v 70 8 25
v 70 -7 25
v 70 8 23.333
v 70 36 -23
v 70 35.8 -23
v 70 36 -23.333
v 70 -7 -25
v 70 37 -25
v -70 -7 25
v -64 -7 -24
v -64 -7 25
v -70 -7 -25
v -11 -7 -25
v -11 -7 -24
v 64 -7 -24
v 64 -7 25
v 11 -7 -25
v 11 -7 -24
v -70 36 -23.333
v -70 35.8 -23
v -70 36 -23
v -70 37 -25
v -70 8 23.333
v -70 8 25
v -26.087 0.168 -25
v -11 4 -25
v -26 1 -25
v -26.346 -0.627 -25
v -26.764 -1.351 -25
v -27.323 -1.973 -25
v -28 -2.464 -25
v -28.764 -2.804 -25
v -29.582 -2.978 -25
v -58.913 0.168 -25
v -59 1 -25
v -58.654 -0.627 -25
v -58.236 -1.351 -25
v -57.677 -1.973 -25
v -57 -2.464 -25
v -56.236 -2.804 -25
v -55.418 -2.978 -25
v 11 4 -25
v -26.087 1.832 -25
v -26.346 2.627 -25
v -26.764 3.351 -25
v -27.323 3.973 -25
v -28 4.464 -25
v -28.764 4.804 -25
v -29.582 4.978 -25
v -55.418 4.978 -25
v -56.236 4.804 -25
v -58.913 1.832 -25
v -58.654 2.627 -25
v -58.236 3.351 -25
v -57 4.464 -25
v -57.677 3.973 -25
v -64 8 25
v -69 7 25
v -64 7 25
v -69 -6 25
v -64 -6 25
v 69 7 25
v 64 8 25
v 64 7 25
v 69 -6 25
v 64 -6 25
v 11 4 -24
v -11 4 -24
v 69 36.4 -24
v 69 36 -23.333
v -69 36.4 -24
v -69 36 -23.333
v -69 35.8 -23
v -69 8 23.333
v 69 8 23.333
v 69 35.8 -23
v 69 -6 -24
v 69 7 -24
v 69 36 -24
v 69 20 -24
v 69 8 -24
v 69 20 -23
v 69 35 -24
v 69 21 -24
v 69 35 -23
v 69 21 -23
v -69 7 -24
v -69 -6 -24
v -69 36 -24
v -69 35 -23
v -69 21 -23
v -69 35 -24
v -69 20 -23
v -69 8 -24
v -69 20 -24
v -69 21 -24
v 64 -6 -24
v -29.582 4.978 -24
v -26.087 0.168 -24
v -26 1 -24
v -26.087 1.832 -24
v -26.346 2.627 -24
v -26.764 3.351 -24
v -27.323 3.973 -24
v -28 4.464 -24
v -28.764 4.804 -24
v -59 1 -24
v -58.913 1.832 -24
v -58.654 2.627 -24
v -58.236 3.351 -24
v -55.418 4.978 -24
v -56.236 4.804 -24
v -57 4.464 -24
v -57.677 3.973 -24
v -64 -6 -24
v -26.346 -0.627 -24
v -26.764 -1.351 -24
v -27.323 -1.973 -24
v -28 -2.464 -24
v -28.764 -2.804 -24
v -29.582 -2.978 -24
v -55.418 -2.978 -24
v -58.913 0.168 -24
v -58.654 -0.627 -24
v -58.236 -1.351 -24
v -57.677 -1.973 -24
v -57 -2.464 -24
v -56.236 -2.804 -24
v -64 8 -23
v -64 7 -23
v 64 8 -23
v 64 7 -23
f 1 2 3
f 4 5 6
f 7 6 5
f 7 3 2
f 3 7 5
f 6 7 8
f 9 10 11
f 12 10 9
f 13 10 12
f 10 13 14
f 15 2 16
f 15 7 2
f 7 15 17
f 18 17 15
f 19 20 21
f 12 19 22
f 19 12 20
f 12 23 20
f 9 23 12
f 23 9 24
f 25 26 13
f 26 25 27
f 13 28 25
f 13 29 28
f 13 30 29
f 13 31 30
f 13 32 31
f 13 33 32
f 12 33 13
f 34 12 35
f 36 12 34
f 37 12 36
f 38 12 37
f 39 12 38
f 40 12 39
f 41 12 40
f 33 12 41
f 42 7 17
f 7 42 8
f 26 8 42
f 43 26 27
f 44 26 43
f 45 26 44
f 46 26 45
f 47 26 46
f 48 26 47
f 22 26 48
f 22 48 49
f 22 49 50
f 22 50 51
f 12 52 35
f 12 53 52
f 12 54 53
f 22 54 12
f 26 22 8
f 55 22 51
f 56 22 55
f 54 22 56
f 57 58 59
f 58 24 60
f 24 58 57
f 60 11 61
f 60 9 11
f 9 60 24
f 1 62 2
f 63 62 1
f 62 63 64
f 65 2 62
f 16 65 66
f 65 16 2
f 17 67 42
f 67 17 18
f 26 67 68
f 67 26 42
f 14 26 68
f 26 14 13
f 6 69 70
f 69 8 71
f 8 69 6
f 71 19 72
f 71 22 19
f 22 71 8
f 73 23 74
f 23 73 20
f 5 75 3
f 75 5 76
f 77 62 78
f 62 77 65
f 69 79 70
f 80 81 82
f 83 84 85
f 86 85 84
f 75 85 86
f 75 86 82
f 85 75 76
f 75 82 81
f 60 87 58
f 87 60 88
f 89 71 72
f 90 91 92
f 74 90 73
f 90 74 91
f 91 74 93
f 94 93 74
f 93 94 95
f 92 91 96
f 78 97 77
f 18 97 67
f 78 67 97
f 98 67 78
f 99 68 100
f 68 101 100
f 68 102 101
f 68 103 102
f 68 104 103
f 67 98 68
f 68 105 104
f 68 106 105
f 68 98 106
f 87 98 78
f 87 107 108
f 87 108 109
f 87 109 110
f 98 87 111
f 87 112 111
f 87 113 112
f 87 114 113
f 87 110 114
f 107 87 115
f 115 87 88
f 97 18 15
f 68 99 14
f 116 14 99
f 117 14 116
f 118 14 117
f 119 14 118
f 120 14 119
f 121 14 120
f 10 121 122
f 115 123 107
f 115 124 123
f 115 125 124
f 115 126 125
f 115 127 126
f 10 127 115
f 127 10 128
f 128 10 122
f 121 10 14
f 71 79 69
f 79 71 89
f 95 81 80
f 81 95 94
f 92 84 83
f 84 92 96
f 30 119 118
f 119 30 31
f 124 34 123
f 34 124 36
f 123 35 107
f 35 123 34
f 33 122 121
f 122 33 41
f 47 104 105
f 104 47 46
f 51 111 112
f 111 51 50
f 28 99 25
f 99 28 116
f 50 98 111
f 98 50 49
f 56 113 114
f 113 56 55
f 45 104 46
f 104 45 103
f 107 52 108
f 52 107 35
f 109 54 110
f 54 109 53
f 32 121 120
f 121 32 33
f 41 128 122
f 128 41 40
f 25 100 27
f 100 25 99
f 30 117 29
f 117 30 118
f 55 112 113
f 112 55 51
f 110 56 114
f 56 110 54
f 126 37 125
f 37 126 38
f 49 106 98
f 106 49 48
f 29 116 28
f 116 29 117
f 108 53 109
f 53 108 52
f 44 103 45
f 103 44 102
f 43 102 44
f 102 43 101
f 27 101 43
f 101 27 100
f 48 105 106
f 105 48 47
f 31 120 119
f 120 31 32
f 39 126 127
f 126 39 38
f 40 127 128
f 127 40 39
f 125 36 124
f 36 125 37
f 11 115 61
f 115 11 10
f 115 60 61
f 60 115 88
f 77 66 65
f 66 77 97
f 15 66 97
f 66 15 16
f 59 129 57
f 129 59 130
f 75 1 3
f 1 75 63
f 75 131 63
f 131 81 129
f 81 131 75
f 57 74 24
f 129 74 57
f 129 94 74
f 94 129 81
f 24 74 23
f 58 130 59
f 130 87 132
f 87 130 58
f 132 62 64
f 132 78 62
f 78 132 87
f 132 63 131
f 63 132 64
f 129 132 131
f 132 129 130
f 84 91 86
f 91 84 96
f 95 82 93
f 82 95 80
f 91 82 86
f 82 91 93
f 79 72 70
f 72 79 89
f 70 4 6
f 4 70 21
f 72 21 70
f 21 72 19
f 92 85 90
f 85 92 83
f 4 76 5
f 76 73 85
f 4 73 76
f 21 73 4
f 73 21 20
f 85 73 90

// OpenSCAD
module prism(l, w, h){
 polyhedron(
     points=[[0,0,0], [l,0,0], [l,w,0], [0,w,0], [0,w,h], [l,w,h]],
     faces=[[0,1,2,3],[5,4,3,2],[0,4,5,1],[0,3,4],[5,2,1]]
  );
}

// main object       
rotate([-90,0,0]) {
difference() {
    difference() {
        union() {
            difference() {
                // base cube
                cube([140,50,14],center=true);
                // cutting away two walls and inside of cube
                translate([0,0,-2]) cube([22,50,12],center=true);
            }
            translate([-70,-25,7]) prism(140,50,30);
        }
        // spacer for the holding bracket
        translate([-69,-25,-9]) cube([138,49,100]); 
    }
    // opening for operating on/off switch
    translate([-55,25,1]) {
        rotate([90,0,0]) linear_extrude(height=2) 
        hull() {
            circle($fn=30,d=8);
            translate([25,0,0]) circle($fn=30,d=8);
        }
    }

}  
// parts where the GPS slides in
translate([-70,-25,-7]) cube([6,50,1]);
translate([64,-25,-7]) cube([6,50,1]);
translate([-70,-25,7]) cube([6,50,1]);
translate([64,-25,7]) cube([6,50,1]);
// add some stiffness to the big part
translate([-70,23,7]) cube([140,1,1]);
translate([-70,23,20]) cube([140,1,1]);
translate([-70,23,35]) cube([140,1,1]);

}
